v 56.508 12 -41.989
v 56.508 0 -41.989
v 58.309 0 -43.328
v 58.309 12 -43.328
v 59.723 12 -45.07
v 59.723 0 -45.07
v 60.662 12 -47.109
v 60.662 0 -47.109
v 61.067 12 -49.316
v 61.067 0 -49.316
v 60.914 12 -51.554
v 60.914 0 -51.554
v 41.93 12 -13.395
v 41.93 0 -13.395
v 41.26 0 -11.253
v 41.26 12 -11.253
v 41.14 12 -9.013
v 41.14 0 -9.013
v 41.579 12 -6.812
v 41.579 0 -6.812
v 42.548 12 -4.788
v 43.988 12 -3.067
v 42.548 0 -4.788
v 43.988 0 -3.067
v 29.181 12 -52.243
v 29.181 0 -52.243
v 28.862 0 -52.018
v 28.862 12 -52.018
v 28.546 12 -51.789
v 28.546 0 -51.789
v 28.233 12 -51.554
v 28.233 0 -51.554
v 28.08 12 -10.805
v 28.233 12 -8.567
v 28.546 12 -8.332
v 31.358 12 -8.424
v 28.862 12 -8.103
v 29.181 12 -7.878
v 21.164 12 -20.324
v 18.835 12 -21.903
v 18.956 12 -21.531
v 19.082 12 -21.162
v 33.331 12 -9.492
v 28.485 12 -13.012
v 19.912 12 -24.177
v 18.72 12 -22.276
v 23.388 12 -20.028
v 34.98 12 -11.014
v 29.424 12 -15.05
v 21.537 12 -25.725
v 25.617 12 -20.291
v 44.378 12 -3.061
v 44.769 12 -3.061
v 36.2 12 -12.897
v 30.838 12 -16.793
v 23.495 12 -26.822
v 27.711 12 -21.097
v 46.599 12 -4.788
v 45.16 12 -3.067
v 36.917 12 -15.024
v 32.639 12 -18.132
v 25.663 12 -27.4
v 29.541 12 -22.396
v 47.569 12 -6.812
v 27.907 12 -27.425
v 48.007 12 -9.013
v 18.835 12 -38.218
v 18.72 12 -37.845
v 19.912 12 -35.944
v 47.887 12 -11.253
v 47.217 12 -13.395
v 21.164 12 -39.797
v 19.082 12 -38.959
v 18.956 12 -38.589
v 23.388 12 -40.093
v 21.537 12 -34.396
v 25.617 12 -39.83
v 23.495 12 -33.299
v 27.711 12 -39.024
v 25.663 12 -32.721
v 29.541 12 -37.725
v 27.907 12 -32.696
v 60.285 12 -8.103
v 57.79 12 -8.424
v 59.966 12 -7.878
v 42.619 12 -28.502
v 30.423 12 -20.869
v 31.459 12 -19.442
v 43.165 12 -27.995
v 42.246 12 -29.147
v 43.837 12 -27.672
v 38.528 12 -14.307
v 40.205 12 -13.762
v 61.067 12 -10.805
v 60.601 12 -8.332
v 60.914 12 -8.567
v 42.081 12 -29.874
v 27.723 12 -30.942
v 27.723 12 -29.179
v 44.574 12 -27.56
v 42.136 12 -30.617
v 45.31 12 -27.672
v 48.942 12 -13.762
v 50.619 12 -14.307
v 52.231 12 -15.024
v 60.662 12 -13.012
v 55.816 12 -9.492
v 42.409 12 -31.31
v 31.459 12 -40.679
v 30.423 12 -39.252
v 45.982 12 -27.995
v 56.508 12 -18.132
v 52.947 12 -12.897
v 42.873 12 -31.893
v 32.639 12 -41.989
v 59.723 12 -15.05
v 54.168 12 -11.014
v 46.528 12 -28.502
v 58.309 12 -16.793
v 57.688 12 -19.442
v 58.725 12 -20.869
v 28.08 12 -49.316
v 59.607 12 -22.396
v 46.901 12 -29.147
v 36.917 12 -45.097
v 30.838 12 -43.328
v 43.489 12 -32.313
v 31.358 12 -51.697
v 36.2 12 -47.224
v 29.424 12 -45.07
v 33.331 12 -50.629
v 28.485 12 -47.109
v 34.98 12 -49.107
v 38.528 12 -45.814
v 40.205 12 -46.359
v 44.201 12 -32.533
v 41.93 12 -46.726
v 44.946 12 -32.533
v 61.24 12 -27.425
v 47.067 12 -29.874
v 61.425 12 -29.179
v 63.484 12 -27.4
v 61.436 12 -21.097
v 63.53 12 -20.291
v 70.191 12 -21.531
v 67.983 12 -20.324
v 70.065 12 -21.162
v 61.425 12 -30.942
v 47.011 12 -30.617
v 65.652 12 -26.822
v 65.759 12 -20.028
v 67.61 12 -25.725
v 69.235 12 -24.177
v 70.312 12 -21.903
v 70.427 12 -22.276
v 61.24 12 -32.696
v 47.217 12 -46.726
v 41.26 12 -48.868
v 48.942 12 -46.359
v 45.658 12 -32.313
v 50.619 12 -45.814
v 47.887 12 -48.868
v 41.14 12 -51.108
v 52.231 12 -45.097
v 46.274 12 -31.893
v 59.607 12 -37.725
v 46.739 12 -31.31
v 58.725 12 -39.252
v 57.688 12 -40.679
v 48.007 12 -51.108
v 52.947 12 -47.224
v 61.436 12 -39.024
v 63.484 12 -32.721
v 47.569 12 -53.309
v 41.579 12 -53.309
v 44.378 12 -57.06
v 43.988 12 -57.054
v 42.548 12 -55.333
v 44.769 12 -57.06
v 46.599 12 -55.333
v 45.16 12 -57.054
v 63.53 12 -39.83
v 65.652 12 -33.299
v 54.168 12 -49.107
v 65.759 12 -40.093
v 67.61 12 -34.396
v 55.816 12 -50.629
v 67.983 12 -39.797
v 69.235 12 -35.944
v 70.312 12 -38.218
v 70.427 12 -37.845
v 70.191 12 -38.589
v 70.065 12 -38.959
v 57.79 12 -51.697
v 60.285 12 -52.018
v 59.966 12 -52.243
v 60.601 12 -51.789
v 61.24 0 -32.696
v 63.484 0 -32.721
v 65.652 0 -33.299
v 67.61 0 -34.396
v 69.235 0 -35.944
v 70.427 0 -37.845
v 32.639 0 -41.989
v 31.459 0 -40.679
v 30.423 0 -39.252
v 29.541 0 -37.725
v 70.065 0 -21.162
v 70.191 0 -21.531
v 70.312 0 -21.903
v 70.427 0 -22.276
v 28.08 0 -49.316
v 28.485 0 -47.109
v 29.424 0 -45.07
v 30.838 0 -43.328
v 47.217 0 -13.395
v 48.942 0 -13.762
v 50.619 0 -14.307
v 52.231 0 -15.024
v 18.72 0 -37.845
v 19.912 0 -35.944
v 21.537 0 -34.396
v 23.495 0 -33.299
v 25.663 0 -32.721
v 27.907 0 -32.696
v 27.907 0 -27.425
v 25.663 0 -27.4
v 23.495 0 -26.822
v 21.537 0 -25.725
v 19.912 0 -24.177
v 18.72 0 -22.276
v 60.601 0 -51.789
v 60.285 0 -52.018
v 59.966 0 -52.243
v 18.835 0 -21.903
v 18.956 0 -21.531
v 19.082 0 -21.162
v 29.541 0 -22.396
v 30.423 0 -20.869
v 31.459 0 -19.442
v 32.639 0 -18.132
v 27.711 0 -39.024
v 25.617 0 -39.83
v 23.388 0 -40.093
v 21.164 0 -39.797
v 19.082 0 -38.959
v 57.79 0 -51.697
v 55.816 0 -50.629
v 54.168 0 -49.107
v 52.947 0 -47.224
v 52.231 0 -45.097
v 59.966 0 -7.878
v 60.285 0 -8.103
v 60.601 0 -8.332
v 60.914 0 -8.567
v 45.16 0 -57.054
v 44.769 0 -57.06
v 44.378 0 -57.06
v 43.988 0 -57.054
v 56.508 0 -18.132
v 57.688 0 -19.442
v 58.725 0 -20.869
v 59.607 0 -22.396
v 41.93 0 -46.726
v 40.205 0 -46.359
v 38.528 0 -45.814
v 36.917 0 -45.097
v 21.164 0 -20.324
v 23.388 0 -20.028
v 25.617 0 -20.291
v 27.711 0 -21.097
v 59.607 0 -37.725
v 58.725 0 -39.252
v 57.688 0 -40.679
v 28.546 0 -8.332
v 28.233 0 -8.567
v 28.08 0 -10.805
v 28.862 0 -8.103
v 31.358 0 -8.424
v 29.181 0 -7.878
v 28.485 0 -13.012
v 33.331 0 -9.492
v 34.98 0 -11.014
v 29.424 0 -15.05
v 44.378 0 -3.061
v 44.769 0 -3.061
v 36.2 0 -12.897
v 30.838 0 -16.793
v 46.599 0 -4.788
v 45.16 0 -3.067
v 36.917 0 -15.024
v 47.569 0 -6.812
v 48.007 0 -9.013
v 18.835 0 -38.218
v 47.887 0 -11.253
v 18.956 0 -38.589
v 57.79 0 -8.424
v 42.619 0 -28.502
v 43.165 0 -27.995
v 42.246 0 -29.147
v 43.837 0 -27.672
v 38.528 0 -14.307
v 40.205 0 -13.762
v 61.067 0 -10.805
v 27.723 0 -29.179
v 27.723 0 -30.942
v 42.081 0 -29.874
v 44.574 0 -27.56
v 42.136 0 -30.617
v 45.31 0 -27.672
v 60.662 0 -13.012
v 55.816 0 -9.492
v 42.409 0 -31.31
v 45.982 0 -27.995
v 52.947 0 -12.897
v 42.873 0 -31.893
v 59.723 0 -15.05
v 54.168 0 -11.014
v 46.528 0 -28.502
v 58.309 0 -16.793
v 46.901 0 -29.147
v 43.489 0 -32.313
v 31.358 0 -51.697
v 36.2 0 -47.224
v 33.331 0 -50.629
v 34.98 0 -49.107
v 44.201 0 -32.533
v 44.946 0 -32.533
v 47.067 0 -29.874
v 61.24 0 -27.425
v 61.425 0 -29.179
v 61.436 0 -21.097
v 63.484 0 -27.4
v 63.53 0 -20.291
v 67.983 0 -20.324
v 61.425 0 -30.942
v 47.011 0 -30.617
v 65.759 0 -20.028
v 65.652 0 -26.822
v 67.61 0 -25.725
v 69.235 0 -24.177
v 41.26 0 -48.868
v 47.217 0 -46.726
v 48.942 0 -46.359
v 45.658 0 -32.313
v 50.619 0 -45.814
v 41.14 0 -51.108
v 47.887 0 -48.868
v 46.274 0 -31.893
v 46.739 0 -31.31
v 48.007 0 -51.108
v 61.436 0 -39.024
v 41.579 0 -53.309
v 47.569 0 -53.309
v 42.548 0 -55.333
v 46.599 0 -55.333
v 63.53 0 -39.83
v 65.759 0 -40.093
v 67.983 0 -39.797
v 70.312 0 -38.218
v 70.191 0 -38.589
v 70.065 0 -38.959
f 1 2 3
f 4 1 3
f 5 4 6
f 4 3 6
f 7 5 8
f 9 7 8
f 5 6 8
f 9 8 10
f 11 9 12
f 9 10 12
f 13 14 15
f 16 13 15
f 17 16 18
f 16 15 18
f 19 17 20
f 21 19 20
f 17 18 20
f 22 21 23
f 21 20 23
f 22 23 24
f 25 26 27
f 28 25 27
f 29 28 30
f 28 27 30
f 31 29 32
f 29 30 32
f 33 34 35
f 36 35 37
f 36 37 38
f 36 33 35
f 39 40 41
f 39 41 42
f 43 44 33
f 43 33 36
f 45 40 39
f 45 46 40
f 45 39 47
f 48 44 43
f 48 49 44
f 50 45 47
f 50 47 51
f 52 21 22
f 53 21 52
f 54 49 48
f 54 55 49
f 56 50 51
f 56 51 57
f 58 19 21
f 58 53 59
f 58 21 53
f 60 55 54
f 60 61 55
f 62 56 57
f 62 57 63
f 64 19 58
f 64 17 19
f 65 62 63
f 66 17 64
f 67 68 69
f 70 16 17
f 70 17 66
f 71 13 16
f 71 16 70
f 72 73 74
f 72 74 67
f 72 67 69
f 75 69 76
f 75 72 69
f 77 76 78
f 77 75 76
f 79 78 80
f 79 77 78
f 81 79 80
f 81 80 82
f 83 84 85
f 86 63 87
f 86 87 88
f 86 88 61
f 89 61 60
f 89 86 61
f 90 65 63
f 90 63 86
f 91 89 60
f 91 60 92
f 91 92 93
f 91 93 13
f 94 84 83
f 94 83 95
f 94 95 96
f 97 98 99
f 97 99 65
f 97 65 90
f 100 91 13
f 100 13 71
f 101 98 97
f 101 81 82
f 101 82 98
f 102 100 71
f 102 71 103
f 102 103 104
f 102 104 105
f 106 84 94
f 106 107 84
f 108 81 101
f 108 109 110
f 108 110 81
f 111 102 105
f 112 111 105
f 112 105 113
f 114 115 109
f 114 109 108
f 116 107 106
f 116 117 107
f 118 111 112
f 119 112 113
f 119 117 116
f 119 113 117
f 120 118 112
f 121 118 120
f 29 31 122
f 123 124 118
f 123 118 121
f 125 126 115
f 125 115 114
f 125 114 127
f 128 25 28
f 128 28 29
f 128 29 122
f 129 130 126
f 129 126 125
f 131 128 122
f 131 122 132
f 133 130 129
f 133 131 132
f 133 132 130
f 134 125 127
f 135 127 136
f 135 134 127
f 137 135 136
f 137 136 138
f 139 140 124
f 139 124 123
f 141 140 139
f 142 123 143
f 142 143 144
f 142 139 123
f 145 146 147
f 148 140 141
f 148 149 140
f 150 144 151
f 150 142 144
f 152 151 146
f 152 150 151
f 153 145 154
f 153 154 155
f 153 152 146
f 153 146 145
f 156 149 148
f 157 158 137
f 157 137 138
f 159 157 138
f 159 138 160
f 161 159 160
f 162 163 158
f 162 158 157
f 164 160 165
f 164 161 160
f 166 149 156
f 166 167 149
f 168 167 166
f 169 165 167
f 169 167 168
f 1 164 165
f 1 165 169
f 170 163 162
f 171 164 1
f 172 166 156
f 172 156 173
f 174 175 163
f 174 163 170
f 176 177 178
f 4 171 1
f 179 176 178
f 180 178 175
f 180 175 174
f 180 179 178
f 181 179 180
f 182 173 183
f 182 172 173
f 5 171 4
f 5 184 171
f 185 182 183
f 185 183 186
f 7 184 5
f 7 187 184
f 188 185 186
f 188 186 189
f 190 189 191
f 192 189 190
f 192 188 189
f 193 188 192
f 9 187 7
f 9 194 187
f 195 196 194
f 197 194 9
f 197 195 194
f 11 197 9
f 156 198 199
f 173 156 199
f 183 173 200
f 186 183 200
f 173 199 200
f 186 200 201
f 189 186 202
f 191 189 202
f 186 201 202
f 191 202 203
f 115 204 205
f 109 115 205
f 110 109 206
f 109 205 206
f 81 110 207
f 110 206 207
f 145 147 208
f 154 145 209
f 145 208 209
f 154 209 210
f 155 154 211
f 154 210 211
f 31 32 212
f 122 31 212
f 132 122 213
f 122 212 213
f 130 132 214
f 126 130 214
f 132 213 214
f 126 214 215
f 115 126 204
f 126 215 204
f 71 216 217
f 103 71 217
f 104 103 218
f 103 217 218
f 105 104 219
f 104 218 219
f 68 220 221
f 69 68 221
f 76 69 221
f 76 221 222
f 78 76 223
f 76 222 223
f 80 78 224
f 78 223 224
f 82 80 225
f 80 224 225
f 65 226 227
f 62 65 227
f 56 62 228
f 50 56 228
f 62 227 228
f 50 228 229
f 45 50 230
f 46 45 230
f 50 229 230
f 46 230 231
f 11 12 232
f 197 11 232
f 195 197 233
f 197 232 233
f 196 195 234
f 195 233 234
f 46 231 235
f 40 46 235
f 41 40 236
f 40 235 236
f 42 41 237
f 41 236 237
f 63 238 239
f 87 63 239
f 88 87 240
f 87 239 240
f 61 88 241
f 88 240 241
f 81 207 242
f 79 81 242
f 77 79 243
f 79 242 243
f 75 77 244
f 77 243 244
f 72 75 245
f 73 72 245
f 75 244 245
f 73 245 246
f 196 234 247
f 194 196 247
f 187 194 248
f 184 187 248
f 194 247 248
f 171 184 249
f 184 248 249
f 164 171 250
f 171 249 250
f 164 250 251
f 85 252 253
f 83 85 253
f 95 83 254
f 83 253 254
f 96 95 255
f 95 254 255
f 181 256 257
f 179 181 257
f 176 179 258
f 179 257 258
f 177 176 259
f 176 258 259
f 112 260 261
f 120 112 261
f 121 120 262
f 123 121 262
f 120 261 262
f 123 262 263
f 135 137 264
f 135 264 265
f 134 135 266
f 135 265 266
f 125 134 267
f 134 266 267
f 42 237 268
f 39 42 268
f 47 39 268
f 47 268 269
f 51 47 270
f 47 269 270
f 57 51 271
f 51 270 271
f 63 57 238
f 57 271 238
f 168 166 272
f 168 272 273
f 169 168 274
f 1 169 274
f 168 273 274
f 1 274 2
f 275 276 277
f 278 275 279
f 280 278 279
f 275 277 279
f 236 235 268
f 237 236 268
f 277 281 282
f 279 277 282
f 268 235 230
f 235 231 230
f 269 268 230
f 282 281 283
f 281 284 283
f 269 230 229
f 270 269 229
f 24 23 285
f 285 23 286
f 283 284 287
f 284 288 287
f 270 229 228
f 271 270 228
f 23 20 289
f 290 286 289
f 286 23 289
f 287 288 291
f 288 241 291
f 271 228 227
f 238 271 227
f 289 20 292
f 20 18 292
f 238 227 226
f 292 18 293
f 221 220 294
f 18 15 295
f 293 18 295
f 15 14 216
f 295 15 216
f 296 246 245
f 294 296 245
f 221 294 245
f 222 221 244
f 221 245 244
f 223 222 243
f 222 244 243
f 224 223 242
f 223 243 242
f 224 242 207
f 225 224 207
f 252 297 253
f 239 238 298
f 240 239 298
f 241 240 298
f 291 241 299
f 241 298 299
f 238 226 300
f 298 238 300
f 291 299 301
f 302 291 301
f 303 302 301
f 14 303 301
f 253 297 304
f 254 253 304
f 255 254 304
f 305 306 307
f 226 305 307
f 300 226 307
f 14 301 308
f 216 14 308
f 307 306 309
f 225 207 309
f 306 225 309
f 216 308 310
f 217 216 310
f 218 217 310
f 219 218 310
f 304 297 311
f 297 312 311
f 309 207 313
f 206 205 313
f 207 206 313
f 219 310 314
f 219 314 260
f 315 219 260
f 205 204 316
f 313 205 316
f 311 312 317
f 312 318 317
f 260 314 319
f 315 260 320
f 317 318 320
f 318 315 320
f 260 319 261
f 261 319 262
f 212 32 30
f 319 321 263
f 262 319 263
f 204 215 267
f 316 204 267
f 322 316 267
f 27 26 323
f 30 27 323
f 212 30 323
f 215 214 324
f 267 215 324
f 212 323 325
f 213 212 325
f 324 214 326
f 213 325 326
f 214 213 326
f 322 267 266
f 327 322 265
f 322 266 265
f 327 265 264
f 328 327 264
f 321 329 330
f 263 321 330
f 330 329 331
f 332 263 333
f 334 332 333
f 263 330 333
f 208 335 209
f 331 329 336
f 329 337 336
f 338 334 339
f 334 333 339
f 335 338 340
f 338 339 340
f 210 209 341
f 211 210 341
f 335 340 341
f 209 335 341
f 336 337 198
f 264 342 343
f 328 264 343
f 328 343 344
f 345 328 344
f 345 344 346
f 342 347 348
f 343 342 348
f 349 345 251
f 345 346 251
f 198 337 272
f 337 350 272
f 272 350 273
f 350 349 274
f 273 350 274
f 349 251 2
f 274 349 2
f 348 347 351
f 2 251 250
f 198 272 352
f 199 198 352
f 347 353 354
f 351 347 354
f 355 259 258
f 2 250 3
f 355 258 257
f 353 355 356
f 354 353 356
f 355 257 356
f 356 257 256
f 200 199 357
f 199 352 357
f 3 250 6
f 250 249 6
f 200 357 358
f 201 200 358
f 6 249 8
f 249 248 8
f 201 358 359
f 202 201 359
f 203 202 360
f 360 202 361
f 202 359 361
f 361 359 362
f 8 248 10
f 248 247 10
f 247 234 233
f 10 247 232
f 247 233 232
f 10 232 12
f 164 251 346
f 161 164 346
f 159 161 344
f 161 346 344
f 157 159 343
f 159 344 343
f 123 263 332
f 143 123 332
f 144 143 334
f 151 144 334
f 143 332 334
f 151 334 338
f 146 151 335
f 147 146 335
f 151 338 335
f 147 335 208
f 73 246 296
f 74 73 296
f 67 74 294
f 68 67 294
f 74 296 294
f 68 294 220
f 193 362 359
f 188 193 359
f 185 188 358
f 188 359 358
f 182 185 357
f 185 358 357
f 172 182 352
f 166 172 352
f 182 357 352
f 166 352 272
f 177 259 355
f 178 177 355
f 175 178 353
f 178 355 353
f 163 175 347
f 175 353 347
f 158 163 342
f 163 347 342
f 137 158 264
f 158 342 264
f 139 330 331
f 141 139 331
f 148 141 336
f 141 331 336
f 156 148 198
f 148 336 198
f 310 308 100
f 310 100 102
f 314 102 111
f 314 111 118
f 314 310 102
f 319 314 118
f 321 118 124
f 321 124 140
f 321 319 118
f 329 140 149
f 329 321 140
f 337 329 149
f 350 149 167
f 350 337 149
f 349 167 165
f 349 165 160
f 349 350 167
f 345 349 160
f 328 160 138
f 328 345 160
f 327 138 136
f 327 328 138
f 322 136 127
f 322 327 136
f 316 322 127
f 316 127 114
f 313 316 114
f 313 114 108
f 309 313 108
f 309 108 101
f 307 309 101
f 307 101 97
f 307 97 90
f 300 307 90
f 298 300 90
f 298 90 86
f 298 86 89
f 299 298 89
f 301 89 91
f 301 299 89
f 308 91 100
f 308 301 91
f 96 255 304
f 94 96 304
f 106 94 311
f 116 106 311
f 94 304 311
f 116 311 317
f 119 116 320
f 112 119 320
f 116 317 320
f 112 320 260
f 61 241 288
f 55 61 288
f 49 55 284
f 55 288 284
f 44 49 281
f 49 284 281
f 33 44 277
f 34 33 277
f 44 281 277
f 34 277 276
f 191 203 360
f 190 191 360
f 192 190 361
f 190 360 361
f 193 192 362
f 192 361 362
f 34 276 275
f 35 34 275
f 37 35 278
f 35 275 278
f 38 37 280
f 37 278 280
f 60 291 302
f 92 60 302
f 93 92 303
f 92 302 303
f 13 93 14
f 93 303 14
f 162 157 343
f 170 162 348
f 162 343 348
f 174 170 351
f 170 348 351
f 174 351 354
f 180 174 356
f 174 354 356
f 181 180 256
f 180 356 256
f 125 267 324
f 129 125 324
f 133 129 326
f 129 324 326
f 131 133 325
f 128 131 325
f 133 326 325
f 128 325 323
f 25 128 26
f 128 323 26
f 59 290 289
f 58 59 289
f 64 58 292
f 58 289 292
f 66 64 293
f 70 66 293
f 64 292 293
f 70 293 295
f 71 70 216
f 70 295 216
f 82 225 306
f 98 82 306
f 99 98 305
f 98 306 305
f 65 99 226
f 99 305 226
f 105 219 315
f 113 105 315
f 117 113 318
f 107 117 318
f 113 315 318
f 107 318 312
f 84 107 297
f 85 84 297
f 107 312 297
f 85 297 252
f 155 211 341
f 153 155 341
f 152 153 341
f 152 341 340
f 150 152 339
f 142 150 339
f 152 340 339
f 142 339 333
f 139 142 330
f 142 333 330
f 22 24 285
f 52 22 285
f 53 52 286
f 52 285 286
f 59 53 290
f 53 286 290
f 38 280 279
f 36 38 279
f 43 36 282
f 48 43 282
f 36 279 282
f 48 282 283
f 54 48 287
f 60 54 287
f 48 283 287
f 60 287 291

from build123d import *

# Parameters (mm, degrees)
SKETCH1_R           = 2.5
BOSS_EXTRUDE2_DEPTH = 12


with BuildPart() as part:
    # Sketch1 → Boss-Extrude2 (new body)
    with BuildSketch(Plane(origin=(0, 0, 0), x_dir=(1, 0, 0), z_dir=(0, 1, 0))):
        with BuildLine():
            ThreePointArc((45.159534103, 57.054132786), (44.573597006, 57.060491355), (43.987659909, 57.054132786))
            ThreePointArc((43.987659909, 57.054132786), (41.29051652, 52.222505932), (41.929927551, 46.72611129))
            ThreePointArc((41.929927551, 46.72611129), (39.359244243, 46.108619011), (36.916564905, 45.097171022))
            ThreePointArc((36.916564905, 45.097171022), (34.203159585, 49.919684069), (29.181165736, 52.243211197))
            ThreePointArc((29.181165736, 52.243211197), (28.703395194, 51.903950203), (28.233099598, 51.554400828))
            ThreePointArc((28.233099598, 51.554400828), (28.891023769, 46.060191485), (32.639017871, 41.989351186))
            ThreePointArc((32.639017871, 41.989351186), (30.922244243, 39.978779702), (29.540589358, 37.724730199))
            ThreePointArc((29.540589358, 37.724730199), (24.510796293, 40.031325579), (19.082182945, 38.959244591))
            ThreePointArc((19.082182945, 38.959244591), (18.895071066, 38.403950203), (18.720053904, 37.844726003))
            ThreePointArc((18.720053904, 37.844726003), (22.481740965, 33.786535398), (27.90671178, 32.696172074))
            ThreePointArc((27.90671178, 32.696172074), (27.699597006, 30.060491355), (27.90671178, 27.424810636))
            ThreePointArc((27.90671178, 27.424810636), (22.481740964, 26.334447311), (18.720053904, 22.276256707))
            ThreePointArc((18.720053904, 22.276256707), (18.895071066, 21.717032507), (19.082182945, 21.161738118))
            ThreePointArc((19.082182945, 21.161738118), (24.510796293, 20.089657131), (29.540589358, 22.396252511))
            ThreePointArc((29.540589358, 22.396252511), (30.922244243, 20.142203008), (32.639017871, 18.131631524))
            ThreePointArc((32.639017871, 18.131631524), (28.891023769, 14.060791225), (28.233099598, 8.566581881))
            ThreePointArc((28.233099598, 8.566581881), (28.703395194, 8.217032507), (29.181165736, 7.877771512))
            ThreePointArc((29.181165736, 7.877771512), (34.203159585, 10.20129864), (36.916564905, 15.023811688))
            ThreePointArc((36.916564905, 15.023811688), (39.359244243, 14.012363699), (41.929927551, 13.39487142))
            ThreePointArc((41.929927551, 13.39487142), (41.29051652, 7.898476778), (43.987659909, 3.066849924))
            ThreePointArc((43.987659909, 3.066849924), (44.573597006, 3.060491355), (45.159534103, 3.066849924))
            ThreePointArc((45.159534103, 3.066849924), (47.856677493, 7.898476778), (47.217266462, 13.39487142))
            ThreePointArc((47.217266462, 13.39487142), (49.787949769, 14.012363699), (52.230629107, 15.023811688))
            ThreePointArc((52.230629107, 15.023811688), (54.944034428, 10.201298641), (59.966028276, 7.877771513))
            ThreePointArc((59.966028276, 7.877771513), (60.443798818, 8.217032507), (60.914094414, 8.566581881))
            ThreePointArc((60.914094414, 8.566581881), (60.256170243, 14.060791225), (56.508176141, 18.131631524))
            ThreePointArc((56.508176141, 18.131631524), (58.224949769, 20.142203008), (59.606604654, 22.396252511))
            ThreePointArc((59.606604654, 22.396252511), (64.636397719, 20.089657131), (70.065011067, 21.161738118))
            ThreePointArc((70.065011067, 21.161738118), (70.252122946, 21.717032507), (70.427140109, 22.276256707))
            ThreePointArc((70.427140109, 22.276256707), (66.665453048, 26.334447311), (61.240482233, 27.424810636))
            ThreePointArc((61.240482233, 27.424810636), (61.447597006, 30.060491355), (61.240482233, 32.696172074))
            ThreePointArc((61.240482233, 32.696172074), (66.665453048, 33.786535398), (70.427140109, 37.844726003))
            ThreePointArc((70.427140109, 37.844726003), (70.252122946, 38.403950203), (70.065011067, 38.959244591))
            ThreePointArc((70.065011067, 38.959244591), (64.636397719, 40.031325579), (59.606604654, 37.724730199))
            ThreePointArc((59.606604654, 37.724730199), (58.224949769, 39.978779702), (56.508176141, 41.989351186))
            ThreePointArc((56.508176141, 41.989351186), (60.256170243, 46.060191485), (60.914094414, 51.554400828))
            ThreePointArc((60.914094414, 51.554400828), (60.443798818, 51.903950203), (59.966028276, 52.243211197))
            ThreePointArc((59.966028276, 52.243211197), (54.944034428, 49.919684069), (52.230629107, 45.097171022))
            ThreePointArc((52.230629107, 45.097171022), (49.787949769, 46.108619011), (47.217266462, 46.72611129))
            ThreePointArc((47.217266462, 46.72611129), (47.856677493, 52.222505932), (45.159534103, 57.054132786))
        make_face()
        with Locations(Location((44.573597006, 30.060491355, 0), (0, 0, 270))):  # turned: the seam where the file's is
            Circle(SKETCH1_R, mode=Mode.SUBTRACT)
    extrude(amount=BOSS_EXTRUDE2_DEPTH)


solid = part.part
